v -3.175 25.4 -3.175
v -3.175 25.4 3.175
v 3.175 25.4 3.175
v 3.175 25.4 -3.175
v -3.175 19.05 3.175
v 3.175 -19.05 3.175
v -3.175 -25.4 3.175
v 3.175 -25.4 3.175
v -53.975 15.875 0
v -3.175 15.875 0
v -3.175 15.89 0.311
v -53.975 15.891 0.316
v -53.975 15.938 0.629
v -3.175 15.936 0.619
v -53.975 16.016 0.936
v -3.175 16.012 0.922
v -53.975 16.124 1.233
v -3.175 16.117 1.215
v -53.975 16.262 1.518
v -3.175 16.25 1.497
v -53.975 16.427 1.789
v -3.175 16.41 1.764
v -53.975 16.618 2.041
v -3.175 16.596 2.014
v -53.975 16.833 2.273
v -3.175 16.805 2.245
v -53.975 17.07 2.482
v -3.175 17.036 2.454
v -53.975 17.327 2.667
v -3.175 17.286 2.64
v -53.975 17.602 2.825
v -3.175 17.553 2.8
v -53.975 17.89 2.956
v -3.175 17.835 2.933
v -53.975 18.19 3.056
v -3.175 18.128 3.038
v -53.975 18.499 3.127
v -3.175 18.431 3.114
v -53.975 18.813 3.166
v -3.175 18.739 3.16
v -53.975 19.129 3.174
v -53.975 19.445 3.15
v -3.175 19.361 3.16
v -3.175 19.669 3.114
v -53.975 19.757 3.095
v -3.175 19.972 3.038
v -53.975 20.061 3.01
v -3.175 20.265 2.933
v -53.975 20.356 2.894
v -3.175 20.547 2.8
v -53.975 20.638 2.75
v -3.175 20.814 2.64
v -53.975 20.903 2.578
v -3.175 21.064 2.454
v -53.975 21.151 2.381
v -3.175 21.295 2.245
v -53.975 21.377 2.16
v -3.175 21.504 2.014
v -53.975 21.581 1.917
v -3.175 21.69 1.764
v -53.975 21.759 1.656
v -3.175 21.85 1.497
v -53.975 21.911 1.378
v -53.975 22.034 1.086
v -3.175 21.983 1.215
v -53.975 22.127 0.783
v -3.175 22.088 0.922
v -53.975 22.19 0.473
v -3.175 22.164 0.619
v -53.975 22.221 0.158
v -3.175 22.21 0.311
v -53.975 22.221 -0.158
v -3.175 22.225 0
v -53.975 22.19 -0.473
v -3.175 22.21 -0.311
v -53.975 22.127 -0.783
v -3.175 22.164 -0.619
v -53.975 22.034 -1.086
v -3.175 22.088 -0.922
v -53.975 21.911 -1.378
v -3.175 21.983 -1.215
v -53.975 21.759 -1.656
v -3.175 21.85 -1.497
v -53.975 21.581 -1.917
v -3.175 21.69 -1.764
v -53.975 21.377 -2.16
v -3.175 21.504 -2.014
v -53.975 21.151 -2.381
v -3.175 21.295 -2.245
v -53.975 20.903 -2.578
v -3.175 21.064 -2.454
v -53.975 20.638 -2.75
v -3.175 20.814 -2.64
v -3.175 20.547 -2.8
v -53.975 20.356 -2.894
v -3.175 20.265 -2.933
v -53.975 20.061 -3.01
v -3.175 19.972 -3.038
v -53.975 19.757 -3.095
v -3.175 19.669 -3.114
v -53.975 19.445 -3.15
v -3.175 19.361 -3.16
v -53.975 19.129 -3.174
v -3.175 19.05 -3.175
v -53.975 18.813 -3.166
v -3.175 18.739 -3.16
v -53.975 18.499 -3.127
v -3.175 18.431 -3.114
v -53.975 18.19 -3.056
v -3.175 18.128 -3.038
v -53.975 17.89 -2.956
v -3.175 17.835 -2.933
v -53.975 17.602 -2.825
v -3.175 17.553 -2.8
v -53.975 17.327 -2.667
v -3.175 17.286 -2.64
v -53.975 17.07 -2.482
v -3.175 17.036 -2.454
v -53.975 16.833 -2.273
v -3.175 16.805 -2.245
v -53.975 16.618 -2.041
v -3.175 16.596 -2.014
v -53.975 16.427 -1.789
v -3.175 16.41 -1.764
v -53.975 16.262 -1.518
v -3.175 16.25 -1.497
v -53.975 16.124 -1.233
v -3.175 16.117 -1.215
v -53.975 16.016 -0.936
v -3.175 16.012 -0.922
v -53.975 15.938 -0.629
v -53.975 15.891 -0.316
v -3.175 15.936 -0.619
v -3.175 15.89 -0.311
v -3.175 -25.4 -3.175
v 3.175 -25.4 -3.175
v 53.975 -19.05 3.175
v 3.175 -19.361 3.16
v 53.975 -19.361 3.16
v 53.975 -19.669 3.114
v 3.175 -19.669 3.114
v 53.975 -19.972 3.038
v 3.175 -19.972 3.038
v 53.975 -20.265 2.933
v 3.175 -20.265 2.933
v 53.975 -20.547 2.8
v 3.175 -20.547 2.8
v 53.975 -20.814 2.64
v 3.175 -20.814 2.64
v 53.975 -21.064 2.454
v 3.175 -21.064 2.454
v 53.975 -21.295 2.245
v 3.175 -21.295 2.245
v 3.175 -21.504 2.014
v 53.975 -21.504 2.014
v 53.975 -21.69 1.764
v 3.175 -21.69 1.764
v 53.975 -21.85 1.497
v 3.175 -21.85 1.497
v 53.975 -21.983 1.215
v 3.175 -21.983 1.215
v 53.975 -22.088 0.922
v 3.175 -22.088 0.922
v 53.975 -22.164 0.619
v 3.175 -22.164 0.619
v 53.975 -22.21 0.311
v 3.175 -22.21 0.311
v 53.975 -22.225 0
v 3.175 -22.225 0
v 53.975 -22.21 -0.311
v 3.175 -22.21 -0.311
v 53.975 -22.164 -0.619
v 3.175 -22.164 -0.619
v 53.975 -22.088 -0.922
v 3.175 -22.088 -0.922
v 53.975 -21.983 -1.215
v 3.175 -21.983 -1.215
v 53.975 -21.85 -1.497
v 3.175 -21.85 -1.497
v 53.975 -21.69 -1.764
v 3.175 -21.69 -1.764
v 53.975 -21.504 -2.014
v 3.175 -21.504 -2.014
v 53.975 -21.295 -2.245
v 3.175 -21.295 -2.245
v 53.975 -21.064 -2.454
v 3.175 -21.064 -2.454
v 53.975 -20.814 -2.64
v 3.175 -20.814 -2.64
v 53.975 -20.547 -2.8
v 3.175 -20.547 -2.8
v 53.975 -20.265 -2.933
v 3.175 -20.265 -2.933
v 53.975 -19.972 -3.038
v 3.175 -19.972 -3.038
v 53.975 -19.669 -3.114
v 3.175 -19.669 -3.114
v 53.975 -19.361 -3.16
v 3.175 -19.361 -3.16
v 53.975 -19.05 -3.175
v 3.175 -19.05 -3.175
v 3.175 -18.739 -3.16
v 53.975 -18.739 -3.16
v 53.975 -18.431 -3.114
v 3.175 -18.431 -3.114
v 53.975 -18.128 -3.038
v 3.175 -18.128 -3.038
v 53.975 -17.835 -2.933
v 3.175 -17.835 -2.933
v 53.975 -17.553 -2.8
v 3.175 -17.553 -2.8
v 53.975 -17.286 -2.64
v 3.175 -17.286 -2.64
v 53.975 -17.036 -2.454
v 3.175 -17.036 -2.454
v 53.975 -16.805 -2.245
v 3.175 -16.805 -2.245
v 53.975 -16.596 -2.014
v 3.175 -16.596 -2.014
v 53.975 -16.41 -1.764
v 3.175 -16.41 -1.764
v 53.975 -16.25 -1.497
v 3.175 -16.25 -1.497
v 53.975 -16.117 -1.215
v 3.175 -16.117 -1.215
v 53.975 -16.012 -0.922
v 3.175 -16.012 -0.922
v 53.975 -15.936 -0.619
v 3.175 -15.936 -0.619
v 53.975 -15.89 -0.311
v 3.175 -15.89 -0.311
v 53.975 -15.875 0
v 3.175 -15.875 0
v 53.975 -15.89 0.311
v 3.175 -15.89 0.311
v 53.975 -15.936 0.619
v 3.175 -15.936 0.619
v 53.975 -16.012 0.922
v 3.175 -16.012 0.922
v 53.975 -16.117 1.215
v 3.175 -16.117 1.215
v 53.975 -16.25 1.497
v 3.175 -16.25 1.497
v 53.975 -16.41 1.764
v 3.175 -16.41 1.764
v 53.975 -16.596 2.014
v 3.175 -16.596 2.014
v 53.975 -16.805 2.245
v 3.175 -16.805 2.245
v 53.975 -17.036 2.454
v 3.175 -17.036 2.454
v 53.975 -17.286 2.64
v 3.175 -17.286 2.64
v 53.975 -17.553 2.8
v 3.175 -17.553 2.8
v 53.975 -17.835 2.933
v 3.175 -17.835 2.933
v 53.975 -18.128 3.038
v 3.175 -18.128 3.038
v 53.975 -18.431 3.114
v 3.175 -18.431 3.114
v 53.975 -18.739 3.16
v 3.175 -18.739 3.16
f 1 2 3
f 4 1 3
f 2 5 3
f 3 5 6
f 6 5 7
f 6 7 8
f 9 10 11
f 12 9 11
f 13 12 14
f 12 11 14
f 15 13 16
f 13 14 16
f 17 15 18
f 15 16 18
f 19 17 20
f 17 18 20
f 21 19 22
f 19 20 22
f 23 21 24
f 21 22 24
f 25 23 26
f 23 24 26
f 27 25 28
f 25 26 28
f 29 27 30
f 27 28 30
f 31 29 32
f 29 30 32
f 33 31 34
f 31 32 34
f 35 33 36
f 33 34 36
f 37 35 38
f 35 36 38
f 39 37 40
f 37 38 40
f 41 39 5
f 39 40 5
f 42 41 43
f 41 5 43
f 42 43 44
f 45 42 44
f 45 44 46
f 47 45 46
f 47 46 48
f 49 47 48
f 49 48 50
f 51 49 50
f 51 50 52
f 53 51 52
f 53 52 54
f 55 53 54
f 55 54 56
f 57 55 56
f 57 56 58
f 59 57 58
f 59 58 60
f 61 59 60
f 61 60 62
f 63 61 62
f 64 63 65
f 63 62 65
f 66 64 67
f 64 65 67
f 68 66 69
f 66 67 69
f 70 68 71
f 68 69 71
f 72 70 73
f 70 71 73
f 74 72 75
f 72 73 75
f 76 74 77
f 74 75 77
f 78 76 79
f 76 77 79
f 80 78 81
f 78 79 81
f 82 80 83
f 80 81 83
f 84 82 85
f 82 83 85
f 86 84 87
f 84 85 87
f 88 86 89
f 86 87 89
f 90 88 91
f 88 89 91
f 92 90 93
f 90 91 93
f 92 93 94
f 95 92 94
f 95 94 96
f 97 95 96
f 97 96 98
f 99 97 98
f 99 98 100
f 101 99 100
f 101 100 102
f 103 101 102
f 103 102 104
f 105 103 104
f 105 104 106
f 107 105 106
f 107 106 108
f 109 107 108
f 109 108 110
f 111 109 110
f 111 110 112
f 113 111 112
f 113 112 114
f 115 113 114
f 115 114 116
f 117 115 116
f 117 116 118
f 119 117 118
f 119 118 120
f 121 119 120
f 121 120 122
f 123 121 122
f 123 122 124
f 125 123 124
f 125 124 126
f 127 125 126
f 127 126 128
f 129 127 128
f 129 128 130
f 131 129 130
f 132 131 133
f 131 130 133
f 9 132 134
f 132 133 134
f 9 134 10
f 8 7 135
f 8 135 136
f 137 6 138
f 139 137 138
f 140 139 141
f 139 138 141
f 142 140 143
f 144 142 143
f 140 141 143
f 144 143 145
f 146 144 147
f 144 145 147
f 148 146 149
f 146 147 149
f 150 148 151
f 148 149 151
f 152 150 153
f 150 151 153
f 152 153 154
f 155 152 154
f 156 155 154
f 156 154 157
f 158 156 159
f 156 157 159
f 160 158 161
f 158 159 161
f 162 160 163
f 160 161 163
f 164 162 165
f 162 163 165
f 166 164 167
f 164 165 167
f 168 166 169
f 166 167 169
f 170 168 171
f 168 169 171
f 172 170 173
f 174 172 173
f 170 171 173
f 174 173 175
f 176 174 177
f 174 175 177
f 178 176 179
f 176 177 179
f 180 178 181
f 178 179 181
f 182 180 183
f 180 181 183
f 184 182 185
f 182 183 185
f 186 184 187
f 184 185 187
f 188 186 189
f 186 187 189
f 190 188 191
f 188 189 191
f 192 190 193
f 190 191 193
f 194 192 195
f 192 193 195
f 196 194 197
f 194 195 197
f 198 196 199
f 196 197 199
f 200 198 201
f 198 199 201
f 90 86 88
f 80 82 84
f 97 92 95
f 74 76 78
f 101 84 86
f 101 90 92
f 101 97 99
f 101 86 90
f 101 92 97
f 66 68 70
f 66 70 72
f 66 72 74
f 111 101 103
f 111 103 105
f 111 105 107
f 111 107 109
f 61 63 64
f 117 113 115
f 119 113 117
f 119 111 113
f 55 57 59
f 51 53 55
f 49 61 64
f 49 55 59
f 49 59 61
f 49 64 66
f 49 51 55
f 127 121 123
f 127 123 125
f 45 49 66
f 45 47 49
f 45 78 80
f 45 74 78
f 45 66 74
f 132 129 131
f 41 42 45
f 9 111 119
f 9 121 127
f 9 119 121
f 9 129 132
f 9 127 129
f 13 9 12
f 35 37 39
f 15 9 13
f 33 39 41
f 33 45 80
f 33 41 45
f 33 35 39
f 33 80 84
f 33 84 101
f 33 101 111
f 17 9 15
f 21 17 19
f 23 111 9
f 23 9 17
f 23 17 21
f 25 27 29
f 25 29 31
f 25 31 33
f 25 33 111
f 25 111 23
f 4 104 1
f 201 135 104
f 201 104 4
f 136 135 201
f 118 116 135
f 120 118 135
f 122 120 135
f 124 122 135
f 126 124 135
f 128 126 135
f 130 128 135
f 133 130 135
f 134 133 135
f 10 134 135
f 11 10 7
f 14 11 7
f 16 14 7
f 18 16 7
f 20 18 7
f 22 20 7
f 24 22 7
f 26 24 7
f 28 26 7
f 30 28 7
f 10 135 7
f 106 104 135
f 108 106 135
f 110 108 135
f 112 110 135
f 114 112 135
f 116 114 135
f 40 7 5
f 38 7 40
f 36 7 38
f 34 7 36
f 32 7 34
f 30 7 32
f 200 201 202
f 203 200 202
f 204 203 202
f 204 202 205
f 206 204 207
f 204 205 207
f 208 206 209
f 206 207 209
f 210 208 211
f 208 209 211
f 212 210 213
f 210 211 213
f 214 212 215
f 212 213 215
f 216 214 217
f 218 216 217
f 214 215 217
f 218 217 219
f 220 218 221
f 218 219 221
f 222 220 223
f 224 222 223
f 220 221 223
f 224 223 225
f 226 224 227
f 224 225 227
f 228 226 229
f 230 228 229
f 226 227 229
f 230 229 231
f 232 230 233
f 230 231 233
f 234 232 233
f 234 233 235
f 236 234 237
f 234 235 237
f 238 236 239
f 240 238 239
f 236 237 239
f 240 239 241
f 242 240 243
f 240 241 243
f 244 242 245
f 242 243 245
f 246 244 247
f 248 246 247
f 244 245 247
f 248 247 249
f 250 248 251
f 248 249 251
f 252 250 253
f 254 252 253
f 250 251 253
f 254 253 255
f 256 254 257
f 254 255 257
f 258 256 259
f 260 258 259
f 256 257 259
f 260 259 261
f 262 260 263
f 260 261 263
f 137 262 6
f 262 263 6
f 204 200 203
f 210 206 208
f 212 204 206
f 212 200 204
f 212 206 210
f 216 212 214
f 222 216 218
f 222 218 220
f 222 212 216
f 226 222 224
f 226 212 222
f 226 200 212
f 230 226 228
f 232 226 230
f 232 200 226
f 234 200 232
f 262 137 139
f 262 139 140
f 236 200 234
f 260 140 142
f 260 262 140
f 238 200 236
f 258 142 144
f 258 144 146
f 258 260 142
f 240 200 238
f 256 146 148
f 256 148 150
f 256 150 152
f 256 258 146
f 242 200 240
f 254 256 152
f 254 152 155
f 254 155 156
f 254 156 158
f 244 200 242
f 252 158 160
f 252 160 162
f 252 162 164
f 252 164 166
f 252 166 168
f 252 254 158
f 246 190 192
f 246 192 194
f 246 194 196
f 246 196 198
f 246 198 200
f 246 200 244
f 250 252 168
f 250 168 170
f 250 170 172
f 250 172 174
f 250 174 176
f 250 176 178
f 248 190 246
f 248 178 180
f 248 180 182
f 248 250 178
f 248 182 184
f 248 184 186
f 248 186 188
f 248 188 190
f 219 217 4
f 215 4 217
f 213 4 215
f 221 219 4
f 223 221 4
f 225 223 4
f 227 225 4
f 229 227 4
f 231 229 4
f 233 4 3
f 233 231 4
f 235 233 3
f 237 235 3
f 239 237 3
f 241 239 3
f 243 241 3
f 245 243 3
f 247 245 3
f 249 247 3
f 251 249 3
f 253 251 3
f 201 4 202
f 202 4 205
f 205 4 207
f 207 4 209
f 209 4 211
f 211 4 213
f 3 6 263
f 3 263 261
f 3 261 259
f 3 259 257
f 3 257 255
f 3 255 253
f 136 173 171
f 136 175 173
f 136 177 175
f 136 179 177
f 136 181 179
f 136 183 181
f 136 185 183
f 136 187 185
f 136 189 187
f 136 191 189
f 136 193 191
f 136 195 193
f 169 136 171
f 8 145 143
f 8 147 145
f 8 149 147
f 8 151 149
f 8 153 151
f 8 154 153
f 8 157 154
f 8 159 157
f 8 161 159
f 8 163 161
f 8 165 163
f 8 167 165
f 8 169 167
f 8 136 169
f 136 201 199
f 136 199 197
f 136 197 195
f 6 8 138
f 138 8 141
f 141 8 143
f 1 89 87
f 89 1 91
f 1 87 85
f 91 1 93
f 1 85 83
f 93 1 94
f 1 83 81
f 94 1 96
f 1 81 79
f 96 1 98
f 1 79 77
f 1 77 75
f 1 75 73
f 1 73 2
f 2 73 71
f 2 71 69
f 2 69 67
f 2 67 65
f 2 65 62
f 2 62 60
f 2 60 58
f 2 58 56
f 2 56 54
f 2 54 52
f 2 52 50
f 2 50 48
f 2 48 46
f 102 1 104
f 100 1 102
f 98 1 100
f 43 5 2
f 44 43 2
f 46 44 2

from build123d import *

# Parameters (mm, degrees)
F0_W     = 6.35
F0_H     = 6.35
F1_DEPTH = 25.4
F3_DEPTH = 50.8
F4_R     = 3.175
F5_DEPTH = 50.8


with BuildPart() as f1:
    # F0 (on Front) → F1 (new body, symmetric)
    with BuildSketch(Plane.XZ):
        Rectangle(F0_W, F0_H)
    extrude(amount=F1_DEPTH, both=True)

    # F2 (on face) → F3 (join)
    with BuildSketch(Plane.YZ.offset(3.175)):
        with BuildLine():
            ThreePointArc((-19.05, -3.175), (-16.8049359697, -2.2450640303), (-15.875, 0))
            ThreePointArc((-15.875, 0), (-16.8049359657, 2.2450640262), (-19.0499999885, 3.175))
            ThreePointArc((-19.0499999885, 3.175), (-22.225, 5.7e-09), (-19.05, -3.175))
        make_face()
    extrude(amount=F3_DEPTH)

    # F4 (on face) → F5 (join)
    with BuildSketch(Plane(origin=(-3.175, 0, 0), x_dir=(0, -1, 0), z_dir=(-1, 0, 0))):
        with Locations((-19.05, 0)):
            Circle(F4_R)
    extrude(amount=F5_DEPTH)


solid = f1.part
